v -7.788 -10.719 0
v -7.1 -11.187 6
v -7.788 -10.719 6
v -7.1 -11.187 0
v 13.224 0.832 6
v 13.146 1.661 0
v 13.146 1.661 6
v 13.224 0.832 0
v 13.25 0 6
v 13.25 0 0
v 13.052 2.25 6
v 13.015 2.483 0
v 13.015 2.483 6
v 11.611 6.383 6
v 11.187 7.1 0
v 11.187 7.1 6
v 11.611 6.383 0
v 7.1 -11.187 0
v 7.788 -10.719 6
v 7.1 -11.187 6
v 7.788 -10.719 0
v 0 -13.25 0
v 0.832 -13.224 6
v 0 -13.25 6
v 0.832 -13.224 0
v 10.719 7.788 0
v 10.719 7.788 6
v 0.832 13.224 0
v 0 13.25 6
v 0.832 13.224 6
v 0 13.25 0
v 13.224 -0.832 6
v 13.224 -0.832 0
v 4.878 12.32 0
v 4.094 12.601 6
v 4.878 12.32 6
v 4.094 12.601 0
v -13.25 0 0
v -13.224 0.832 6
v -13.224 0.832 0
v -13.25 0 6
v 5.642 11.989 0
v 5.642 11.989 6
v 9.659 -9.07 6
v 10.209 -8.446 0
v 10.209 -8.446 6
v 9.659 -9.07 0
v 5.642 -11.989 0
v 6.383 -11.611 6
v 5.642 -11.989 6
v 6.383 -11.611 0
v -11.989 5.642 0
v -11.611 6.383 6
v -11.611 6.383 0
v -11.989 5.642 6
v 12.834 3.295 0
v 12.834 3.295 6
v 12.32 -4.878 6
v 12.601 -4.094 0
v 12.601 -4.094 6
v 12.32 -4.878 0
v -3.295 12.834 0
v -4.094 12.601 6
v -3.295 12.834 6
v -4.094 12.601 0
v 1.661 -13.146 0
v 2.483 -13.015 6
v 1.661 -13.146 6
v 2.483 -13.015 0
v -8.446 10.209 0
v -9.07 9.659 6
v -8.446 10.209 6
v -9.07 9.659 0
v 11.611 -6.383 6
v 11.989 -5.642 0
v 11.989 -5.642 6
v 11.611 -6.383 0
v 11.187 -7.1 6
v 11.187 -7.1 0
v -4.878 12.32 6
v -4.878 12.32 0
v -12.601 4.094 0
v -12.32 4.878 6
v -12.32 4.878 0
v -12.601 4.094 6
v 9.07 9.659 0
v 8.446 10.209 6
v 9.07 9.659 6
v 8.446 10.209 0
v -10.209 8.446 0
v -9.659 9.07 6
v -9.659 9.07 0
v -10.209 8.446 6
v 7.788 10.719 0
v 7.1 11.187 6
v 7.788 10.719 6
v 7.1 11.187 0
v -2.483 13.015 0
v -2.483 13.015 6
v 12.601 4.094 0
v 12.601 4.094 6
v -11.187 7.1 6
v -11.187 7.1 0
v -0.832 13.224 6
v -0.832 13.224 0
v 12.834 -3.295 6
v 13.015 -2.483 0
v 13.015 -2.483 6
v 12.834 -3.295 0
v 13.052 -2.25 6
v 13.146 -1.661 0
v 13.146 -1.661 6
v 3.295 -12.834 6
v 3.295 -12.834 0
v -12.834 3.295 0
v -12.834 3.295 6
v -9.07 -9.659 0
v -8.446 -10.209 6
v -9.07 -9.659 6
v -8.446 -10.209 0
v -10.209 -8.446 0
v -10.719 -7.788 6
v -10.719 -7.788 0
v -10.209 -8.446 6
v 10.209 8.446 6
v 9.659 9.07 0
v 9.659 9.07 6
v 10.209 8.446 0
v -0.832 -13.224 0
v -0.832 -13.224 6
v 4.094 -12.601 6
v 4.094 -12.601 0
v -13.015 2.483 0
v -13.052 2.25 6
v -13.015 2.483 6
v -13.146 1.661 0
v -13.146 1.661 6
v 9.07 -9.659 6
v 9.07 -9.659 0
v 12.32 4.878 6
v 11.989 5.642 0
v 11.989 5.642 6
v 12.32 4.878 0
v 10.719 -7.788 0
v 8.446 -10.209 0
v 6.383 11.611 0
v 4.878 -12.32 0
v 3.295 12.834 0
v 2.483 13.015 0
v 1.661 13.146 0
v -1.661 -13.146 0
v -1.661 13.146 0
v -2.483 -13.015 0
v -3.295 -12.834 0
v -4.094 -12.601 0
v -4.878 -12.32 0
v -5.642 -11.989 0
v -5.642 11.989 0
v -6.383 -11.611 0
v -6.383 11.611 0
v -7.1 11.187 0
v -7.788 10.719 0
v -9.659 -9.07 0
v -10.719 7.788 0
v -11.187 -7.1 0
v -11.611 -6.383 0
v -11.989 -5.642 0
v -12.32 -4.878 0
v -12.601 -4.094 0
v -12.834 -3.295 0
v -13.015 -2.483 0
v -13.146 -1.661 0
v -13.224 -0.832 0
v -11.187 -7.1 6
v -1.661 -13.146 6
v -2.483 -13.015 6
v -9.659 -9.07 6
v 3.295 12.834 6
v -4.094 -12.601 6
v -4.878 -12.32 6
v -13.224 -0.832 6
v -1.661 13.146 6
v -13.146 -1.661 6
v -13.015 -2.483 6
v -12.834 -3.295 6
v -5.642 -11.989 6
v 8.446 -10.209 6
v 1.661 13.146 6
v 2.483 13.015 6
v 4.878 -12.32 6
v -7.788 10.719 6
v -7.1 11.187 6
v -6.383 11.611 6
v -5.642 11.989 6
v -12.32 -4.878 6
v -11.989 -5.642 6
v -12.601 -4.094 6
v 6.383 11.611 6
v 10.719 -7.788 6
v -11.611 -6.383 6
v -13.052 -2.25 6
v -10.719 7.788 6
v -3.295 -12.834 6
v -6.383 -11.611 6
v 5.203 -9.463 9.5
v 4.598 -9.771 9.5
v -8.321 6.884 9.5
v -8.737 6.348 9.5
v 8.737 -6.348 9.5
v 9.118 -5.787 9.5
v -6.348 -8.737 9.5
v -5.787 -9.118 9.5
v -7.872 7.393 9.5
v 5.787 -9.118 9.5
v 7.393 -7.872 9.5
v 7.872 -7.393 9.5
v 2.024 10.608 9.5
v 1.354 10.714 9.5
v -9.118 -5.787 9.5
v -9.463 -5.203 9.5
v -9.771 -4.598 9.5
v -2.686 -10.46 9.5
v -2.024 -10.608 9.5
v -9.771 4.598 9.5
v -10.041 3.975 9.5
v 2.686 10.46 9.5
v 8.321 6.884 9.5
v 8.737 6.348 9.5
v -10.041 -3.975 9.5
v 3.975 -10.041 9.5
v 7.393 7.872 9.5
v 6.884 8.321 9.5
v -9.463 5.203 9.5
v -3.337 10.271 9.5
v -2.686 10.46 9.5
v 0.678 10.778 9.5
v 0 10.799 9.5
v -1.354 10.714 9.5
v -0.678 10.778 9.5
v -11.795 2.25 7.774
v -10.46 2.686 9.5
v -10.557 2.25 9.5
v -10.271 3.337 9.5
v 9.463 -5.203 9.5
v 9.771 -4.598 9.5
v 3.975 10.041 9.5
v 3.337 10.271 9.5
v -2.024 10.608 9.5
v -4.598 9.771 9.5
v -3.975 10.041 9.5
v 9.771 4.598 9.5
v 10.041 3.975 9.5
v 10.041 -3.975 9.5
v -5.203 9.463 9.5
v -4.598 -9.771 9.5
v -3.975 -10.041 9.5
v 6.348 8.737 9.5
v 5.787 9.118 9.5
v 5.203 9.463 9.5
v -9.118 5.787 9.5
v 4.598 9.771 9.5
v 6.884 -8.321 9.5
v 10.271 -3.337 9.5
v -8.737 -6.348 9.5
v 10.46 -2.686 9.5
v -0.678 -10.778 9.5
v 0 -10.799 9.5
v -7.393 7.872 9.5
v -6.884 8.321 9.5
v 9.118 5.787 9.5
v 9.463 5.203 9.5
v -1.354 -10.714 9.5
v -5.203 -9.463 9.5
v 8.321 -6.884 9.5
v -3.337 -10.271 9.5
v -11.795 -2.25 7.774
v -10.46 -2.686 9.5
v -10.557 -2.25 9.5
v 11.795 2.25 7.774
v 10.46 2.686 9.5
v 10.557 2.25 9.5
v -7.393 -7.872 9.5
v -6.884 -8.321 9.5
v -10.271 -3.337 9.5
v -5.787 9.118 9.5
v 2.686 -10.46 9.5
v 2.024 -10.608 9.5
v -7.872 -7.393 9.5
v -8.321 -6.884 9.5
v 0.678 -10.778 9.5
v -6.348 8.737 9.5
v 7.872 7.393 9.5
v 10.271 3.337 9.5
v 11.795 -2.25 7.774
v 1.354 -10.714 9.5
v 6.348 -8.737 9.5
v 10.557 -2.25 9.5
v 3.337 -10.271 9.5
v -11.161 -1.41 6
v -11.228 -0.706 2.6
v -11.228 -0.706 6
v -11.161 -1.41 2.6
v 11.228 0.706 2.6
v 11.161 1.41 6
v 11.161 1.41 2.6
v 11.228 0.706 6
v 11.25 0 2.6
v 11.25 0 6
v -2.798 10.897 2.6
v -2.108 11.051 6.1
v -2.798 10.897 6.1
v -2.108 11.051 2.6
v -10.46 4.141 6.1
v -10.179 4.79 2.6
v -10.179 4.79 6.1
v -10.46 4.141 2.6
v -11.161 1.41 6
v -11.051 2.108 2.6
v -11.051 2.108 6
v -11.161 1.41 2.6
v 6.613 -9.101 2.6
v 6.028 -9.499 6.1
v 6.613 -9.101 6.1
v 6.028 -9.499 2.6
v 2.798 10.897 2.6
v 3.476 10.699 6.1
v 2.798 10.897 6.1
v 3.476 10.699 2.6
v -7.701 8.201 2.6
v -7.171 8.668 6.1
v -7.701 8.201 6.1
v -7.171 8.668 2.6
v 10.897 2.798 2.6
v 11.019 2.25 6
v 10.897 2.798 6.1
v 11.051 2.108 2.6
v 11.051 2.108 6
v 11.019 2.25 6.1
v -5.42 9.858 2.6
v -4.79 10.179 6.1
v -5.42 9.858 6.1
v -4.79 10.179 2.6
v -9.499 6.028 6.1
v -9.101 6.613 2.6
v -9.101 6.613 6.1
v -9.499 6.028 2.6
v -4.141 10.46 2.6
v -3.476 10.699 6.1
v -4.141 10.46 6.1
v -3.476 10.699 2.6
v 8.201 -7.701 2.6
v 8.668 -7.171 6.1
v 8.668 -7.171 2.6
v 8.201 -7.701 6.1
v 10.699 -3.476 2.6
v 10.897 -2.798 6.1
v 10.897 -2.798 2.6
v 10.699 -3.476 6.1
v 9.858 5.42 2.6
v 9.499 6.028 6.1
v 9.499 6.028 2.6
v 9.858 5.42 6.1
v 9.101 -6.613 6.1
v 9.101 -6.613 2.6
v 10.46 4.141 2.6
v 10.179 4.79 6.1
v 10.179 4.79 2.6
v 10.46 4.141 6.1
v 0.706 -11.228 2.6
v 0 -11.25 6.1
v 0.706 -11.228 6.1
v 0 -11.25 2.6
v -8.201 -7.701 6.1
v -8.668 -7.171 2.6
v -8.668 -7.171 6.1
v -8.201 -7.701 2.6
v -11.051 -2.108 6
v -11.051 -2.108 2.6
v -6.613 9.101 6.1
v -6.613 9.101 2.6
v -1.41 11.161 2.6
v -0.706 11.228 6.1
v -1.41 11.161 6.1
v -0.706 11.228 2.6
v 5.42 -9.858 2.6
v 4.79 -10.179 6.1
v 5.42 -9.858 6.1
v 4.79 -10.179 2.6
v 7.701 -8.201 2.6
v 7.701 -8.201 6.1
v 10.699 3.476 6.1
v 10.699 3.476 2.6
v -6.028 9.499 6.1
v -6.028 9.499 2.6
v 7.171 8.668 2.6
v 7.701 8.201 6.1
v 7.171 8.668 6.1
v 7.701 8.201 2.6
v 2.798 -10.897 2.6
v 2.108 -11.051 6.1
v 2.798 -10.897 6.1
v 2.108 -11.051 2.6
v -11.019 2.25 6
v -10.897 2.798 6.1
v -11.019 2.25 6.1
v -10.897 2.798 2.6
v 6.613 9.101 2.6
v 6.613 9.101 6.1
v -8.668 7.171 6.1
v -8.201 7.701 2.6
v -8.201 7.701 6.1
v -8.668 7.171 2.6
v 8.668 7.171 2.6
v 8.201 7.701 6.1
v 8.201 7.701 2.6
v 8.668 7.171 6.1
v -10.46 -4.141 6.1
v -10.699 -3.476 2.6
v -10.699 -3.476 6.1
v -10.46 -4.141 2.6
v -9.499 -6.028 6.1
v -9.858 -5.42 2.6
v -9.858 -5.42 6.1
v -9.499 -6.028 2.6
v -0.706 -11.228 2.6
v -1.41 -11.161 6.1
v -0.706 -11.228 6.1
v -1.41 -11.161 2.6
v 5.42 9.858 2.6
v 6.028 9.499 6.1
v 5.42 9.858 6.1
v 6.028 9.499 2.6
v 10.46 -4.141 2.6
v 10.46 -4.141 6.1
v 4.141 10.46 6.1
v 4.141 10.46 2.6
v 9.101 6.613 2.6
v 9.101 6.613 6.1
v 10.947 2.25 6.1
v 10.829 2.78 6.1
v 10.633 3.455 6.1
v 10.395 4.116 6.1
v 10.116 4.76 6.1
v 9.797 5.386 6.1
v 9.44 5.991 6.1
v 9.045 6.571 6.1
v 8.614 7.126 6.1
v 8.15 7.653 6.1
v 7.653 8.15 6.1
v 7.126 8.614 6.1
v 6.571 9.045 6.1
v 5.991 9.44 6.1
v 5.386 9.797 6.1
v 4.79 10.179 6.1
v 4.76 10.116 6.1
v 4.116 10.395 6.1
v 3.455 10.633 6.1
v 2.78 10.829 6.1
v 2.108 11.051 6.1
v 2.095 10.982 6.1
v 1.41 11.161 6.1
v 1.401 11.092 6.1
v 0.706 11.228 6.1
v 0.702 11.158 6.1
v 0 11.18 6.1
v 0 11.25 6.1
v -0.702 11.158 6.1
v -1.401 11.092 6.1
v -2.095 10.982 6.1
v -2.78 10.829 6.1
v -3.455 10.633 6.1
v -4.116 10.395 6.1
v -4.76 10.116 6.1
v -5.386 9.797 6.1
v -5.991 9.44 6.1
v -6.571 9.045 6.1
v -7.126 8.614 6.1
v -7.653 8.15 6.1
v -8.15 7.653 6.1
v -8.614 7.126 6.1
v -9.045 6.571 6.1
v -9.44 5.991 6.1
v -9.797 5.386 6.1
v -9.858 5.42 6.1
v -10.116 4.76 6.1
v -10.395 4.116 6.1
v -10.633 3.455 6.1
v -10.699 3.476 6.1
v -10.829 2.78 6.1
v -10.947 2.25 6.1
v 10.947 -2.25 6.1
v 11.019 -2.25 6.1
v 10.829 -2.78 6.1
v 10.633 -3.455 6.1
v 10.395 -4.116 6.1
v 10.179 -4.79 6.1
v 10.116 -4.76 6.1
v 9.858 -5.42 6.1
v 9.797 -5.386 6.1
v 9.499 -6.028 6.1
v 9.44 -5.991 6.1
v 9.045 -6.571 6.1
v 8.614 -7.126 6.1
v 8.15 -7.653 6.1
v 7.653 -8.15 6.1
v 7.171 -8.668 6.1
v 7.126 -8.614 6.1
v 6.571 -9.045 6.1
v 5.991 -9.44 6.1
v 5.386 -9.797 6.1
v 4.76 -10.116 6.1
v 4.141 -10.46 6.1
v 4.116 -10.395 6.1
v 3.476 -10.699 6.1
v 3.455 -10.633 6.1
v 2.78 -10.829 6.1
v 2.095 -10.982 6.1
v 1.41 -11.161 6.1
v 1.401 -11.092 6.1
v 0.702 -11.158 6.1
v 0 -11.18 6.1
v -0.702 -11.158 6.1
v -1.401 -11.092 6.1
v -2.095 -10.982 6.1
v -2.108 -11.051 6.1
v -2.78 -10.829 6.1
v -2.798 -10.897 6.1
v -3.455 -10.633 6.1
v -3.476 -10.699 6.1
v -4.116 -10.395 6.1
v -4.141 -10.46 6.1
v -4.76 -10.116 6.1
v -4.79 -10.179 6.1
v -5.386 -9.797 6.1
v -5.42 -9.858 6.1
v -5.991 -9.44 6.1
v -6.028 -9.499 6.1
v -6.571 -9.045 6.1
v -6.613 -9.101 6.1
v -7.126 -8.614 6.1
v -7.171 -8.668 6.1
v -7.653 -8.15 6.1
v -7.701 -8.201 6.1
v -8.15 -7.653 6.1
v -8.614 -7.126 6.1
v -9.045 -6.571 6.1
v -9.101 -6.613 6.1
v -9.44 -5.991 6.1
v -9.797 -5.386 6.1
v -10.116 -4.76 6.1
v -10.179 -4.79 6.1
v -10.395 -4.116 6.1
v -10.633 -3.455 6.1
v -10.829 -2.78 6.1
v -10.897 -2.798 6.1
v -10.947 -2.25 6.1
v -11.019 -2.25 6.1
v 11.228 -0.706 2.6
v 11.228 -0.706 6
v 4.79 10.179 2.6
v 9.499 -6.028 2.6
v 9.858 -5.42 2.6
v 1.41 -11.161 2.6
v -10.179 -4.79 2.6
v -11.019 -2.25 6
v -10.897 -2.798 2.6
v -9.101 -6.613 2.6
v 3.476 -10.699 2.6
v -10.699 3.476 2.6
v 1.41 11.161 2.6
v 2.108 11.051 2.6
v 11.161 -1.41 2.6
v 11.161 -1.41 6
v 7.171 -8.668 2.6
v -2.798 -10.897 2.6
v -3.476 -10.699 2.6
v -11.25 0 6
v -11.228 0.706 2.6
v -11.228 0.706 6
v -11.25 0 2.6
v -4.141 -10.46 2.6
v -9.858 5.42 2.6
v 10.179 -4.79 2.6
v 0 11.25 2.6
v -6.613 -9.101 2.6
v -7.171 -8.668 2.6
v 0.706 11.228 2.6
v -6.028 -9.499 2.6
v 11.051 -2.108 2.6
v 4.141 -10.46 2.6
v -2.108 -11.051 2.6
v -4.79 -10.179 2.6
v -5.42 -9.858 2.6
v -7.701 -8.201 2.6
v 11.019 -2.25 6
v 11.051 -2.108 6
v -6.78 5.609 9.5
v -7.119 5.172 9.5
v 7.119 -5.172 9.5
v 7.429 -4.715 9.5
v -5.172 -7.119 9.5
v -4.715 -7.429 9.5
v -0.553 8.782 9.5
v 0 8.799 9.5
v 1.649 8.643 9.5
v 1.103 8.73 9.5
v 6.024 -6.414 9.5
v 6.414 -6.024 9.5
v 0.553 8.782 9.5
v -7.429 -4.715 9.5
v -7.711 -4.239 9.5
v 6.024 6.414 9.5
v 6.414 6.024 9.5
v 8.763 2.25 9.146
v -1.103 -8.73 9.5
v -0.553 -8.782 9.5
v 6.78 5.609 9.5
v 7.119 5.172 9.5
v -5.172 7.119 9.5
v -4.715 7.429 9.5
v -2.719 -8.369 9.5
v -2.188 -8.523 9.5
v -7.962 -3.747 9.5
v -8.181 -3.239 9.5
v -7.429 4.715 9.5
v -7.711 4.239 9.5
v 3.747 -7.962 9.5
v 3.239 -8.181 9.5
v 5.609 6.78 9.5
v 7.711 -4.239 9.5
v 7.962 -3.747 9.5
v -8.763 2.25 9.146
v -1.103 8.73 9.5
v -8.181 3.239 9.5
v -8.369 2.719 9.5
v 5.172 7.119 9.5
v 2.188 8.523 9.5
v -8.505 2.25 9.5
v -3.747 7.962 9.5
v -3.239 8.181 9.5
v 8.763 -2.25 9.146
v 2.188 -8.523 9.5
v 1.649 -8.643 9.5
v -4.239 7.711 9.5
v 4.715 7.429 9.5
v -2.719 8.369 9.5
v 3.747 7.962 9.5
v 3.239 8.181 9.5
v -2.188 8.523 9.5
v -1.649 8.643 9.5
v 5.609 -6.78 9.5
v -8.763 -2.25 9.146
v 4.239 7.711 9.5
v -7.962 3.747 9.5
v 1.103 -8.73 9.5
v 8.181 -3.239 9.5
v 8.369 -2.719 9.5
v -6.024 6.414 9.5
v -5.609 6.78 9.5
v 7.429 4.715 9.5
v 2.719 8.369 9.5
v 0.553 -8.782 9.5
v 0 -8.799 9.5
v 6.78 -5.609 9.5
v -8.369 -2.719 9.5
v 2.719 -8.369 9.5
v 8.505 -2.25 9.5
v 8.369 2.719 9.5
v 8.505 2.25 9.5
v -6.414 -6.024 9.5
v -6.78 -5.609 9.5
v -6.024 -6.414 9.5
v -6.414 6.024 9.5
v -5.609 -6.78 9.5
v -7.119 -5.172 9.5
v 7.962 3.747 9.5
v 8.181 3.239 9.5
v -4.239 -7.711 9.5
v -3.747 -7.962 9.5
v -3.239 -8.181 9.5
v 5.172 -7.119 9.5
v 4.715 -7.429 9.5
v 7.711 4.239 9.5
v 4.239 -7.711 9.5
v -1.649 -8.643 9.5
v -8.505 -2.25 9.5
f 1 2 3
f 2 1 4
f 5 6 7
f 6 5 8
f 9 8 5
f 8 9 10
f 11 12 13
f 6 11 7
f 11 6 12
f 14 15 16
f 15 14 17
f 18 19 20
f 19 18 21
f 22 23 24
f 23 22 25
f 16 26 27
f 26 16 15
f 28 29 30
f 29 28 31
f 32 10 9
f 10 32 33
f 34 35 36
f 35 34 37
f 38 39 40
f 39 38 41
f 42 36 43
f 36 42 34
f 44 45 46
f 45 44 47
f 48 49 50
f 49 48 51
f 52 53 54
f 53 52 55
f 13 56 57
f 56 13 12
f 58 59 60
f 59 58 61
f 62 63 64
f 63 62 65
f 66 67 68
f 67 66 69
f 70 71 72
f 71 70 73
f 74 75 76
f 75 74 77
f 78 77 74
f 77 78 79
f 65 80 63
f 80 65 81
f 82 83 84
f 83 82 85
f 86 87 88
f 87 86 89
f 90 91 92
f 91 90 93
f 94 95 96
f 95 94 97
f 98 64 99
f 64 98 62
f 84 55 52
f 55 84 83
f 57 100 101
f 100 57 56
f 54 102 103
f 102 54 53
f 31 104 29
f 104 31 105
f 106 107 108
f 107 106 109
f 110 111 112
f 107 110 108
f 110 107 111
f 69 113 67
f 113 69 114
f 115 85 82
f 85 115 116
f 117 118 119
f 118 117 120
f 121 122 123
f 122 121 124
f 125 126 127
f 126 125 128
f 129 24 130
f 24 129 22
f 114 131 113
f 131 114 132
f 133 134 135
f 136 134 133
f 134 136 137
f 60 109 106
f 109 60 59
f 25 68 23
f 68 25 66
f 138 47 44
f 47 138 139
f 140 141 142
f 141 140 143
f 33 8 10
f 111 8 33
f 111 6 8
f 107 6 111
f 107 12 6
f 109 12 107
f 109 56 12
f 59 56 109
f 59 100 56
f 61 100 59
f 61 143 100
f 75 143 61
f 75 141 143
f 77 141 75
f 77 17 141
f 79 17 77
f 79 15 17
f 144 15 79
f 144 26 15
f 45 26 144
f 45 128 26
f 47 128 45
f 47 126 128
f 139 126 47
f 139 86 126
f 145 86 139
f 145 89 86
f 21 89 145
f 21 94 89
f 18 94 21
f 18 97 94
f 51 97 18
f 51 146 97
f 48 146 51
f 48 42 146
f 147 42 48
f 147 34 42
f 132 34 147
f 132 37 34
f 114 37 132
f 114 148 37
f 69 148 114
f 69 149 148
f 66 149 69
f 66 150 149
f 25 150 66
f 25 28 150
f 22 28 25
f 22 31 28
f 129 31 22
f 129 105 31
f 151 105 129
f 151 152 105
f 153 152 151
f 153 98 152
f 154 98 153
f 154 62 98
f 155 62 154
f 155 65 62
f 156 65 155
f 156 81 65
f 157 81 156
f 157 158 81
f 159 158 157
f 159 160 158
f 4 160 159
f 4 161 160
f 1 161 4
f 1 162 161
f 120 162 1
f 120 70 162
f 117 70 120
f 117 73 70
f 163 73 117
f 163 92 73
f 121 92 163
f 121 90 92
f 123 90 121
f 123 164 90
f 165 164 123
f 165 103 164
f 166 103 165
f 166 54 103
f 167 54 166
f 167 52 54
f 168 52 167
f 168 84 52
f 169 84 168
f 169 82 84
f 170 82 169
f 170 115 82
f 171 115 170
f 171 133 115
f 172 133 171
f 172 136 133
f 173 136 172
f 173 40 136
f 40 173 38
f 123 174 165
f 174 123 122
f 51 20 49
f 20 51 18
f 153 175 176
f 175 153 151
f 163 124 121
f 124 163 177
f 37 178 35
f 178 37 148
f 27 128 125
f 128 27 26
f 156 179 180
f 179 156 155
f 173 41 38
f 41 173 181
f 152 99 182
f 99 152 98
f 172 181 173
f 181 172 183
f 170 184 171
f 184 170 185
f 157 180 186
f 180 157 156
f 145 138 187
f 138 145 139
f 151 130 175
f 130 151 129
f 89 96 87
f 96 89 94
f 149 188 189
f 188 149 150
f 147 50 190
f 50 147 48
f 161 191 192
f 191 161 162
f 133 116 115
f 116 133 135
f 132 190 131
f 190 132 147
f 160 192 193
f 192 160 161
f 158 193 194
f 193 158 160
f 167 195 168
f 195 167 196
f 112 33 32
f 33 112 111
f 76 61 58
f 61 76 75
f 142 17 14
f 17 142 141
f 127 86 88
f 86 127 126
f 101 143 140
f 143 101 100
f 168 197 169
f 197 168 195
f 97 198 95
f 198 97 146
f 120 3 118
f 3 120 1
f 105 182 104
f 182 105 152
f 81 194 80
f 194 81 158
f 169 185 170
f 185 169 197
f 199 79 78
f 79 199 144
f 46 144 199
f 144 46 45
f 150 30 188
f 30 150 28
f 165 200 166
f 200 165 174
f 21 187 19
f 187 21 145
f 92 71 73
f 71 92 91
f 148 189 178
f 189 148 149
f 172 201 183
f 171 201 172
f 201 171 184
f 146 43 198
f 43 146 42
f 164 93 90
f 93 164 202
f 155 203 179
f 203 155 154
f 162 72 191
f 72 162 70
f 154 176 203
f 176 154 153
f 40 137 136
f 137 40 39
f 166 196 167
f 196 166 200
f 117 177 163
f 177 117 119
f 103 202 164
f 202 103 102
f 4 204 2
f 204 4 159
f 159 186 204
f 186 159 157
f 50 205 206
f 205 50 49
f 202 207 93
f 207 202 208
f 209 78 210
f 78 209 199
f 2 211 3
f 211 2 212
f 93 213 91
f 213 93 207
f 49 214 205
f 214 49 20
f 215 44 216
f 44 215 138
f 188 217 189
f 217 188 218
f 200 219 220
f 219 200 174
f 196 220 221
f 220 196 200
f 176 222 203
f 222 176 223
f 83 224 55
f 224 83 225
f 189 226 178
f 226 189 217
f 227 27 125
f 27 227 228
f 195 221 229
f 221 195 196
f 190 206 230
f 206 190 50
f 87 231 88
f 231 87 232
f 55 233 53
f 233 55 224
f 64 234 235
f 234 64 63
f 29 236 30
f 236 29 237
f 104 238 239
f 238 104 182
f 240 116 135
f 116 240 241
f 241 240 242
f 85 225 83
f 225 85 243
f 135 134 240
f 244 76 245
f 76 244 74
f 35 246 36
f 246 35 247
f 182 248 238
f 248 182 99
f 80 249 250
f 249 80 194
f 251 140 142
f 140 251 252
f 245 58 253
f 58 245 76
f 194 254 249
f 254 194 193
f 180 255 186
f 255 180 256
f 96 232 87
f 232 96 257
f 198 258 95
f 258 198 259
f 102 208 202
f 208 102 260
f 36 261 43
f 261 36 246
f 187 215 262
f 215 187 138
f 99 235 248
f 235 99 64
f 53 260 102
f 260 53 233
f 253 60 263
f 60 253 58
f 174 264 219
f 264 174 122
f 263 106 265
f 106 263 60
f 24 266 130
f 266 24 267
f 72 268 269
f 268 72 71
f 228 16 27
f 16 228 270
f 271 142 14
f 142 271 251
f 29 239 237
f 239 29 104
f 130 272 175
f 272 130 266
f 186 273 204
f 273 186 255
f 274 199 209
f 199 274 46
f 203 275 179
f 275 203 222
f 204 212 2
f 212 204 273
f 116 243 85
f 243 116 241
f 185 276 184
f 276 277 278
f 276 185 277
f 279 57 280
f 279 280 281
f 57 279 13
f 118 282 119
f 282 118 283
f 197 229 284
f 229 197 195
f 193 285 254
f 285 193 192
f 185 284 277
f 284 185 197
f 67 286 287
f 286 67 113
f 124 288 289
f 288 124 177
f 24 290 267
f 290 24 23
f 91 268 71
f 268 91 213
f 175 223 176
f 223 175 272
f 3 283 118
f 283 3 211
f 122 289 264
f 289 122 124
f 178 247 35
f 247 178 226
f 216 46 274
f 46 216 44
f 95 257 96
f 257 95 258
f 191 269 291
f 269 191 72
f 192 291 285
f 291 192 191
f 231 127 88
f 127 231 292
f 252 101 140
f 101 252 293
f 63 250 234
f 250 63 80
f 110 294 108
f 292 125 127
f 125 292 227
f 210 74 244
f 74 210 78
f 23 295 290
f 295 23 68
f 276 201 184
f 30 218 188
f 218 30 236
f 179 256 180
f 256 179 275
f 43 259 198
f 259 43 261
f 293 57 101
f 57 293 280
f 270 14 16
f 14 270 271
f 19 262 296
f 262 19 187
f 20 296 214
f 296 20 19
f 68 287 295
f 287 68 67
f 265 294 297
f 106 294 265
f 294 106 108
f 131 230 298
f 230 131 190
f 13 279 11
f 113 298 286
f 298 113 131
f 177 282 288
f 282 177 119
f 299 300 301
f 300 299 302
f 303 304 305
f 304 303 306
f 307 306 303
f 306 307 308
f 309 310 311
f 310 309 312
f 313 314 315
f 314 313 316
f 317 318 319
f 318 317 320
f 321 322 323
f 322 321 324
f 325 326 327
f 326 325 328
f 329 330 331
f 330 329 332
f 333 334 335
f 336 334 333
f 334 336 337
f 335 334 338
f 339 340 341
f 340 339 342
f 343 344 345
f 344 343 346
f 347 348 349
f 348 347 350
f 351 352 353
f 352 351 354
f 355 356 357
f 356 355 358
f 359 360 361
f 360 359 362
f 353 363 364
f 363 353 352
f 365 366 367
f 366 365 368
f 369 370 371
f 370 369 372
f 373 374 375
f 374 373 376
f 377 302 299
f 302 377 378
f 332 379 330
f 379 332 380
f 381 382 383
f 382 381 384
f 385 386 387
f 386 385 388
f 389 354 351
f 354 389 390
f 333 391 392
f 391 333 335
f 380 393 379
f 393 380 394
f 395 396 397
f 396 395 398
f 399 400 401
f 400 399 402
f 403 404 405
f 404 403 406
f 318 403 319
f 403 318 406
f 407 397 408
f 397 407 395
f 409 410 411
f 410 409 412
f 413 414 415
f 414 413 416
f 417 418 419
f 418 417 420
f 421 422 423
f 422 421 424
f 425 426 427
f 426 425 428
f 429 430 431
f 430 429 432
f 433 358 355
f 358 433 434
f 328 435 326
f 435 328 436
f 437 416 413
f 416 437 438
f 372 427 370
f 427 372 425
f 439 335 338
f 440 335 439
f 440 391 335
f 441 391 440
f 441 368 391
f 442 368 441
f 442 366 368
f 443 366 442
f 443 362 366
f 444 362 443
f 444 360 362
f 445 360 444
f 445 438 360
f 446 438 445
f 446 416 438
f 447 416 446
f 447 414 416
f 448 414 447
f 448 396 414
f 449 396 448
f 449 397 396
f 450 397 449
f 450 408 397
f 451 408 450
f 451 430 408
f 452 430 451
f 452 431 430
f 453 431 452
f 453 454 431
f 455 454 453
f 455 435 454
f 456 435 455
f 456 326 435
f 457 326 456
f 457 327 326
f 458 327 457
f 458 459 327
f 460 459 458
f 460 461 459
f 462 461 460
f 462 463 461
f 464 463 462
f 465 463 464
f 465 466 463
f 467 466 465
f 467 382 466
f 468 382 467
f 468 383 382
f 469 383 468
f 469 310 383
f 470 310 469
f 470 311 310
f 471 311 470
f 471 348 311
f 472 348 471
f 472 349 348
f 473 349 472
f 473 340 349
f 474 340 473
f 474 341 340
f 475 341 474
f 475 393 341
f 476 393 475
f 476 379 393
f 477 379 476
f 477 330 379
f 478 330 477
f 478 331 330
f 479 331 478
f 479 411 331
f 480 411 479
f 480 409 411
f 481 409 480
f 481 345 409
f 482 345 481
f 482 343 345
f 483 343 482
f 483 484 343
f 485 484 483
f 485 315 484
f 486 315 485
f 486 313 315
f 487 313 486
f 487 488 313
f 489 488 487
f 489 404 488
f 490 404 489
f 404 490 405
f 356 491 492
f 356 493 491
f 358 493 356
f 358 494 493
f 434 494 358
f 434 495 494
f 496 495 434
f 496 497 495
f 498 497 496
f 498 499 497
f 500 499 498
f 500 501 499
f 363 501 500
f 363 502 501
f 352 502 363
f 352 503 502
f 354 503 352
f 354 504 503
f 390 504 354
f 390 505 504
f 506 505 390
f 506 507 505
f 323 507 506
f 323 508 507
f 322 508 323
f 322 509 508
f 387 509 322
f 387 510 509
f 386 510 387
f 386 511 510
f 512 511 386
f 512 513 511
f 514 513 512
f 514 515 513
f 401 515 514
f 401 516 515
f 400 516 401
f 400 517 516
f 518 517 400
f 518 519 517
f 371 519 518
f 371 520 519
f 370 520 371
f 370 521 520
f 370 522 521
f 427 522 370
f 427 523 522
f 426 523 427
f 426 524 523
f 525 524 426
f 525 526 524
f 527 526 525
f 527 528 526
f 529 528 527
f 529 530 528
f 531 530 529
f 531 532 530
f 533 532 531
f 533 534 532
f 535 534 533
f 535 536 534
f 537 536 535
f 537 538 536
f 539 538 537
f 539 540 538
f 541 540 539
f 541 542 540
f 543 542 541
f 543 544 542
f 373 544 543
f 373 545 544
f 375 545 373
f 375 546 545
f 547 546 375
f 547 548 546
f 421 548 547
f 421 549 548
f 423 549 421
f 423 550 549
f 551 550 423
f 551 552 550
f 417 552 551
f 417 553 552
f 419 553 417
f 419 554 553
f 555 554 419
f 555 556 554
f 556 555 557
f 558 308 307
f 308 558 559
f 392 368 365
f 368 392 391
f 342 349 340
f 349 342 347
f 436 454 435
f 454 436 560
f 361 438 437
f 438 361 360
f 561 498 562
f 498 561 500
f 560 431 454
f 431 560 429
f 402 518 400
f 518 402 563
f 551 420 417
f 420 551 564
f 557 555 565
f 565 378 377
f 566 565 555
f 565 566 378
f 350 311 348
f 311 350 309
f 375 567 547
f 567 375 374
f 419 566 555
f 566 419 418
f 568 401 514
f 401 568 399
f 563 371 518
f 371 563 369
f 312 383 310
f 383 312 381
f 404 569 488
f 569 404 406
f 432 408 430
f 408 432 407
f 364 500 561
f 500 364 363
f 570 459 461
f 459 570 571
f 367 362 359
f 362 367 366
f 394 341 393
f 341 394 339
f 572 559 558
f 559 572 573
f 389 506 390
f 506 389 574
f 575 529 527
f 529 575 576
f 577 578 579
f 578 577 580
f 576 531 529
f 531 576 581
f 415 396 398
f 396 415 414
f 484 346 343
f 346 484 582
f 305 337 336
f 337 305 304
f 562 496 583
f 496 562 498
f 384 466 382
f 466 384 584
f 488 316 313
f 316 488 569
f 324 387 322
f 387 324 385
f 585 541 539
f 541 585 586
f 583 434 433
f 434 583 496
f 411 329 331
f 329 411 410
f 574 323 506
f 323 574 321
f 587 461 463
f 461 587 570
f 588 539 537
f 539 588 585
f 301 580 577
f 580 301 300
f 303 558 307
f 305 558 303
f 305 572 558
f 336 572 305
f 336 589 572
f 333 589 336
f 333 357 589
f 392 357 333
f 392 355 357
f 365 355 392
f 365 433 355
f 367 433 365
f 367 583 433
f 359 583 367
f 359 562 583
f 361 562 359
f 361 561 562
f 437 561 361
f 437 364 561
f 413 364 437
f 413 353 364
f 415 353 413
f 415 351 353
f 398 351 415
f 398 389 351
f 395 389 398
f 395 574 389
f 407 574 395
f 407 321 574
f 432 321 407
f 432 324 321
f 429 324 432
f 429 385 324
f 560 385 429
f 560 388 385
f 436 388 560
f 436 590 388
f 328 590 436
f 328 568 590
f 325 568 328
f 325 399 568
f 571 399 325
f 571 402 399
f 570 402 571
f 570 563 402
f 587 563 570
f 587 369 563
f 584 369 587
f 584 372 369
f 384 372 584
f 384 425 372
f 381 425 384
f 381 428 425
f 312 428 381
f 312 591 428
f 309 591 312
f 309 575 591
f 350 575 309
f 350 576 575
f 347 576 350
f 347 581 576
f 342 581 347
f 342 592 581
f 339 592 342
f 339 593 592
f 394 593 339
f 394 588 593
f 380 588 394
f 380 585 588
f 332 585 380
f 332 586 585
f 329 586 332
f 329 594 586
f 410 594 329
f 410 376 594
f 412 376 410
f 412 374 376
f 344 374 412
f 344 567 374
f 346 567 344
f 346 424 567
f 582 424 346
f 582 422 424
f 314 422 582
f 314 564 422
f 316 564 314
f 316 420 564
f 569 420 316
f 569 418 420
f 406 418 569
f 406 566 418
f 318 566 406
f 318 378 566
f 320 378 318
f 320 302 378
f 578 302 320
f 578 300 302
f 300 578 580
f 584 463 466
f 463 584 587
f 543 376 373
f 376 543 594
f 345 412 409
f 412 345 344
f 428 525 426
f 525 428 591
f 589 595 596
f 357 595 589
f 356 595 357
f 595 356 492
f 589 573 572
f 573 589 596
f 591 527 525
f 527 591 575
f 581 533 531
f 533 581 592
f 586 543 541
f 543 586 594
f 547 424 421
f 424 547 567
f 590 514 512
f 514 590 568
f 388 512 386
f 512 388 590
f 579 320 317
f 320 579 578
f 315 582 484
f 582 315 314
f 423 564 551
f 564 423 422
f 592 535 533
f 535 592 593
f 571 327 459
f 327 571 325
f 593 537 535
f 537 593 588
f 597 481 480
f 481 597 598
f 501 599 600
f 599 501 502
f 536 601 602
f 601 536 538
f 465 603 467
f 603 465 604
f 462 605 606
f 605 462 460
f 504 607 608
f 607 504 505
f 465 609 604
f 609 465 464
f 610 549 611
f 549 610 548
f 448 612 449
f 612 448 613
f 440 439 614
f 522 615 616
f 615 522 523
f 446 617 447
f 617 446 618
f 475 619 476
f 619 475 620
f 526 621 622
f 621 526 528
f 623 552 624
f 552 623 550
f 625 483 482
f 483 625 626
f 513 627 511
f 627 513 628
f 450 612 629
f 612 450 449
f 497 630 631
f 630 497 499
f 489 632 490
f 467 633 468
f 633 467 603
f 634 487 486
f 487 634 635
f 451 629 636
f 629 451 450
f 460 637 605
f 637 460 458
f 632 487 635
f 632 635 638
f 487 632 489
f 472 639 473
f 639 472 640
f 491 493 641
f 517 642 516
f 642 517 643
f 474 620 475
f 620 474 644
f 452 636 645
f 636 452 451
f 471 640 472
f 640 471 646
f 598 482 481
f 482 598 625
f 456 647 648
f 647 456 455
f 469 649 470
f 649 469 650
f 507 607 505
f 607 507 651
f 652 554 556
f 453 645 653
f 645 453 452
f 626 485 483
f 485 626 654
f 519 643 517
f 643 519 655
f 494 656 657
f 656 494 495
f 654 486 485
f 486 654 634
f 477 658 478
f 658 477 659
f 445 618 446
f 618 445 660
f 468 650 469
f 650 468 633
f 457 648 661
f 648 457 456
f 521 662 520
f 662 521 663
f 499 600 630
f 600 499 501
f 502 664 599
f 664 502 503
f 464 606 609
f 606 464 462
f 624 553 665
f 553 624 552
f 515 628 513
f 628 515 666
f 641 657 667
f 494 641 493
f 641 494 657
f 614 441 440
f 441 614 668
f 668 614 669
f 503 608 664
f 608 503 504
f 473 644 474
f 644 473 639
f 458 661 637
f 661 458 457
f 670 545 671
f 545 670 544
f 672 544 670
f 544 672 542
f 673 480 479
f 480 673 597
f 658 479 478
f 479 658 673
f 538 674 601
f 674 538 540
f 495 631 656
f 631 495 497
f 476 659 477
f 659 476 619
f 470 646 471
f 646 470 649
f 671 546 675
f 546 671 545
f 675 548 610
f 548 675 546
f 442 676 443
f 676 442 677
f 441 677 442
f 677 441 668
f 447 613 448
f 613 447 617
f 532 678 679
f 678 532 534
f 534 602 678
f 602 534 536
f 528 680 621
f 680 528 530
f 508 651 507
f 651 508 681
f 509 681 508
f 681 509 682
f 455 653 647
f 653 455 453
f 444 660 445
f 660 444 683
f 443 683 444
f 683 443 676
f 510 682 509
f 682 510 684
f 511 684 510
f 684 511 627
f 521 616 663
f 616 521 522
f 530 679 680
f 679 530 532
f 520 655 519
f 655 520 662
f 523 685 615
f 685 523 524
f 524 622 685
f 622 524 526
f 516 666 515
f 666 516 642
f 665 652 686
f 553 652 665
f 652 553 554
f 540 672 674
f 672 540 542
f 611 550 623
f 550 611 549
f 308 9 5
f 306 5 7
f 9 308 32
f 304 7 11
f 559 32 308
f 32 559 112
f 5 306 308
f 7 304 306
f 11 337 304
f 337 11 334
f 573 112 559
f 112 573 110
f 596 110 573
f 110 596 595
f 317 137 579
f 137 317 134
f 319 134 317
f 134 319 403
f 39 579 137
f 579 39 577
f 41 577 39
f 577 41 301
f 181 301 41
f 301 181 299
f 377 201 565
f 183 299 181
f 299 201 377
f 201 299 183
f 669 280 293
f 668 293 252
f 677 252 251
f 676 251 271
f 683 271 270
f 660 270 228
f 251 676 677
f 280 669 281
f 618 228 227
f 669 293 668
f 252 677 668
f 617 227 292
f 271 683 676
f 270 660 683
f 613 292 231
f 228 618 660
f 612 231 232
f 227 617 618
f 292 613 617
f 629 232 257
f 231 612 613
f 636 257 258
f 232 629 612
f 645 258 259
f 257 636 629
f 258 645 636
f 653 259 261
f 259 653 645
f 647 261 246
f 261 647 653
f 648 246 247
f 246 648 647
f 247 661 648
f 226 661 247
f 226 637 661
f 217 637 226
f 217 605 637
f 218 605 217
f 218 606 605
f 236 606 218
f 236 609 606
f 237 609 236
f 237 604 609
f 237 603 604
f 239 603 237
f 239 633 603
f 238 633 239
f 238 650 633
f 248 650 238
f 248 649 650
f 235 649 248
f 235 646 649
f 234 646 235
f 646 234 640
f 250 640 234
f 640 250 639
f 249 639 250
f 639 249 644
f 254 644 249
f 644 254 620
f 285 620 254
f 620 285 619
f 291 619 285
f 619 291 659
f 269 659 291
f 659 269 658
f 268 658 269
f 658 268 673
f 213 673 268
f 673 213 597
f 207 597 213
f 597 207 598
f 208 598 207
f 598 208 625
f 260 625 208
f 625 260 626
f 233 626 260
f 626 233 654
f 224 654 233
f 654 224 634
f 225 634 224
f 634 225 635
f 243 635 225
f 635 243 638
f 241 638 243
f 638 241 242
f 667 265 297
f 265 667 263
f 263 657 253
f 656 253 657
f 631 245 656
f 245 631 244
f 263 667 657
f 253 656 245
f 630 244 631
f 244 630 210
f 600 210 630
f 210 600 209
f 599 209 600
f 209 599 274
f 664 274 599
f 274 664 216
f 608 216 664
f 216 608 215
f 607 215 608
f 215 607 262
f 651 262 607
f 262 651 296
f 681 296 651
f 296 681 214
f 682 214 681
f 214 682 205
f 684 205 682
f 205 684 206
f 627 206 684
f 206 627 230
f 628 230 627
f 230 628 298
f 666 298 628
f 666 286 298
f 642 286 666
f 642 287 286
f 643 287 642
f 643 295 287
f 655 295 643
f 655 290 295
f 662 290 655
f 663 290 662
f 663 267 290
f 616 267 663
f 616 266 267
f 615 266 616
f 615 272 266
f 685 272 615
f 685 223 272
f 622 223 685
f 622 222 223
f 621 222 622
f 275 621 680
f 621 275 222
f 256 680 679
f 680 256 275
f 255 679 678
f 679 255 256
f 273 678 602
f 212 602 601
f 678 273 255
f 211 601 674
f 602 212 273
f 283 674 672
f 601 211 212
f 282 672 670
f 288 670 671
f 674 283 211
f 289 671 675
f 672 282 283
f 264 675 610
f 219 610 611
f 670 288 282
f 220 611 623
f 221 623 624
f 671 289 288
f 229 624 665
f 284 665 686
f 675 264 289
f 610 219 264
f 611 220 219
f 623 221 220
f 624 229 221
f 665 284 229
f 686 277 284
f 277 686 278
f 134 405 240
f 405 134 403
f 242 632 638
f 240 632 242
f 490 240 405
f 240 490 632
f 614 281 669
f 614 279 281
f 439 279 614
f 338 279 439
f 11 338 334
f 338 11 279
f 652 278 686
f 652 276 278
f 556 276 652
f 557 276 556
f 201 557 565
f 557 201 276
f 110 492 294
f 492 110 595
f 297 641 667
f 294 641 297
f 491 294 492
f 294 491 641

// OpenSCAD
$fn = 100;

// Bar clamp defaults. Resize these six values for other bars or brands.
// The swivel shape also works for C-clamps; adjust the same dimensions.
//
// Reference sizes:
//   4 in C-clamp:  wallThickness=2, diameter=16, footHeight=2.5,
//                  footThickness=2, slotWidth=2, bootAngle=45
//   10 in C-clamp: wallThickness=2.5, diameter=30.5, footHeight=4,
//                  footThickness=2.5, slotWidth=5.5, bootAngle=45
wallThickness = 2;
diameter = 22.5;
footHeight = 3.5;
footThickness = 2.5;
slotWidth = 4.5;
bootAngle = 55;

//Math
totalHeight = footThickness + footHeight * 2;
radius = (diameter + (wallThickness*2))/2;
innerRadius = radius-wallThickness;

difference(){
  union(){
    cylinder(r=radius, h=footHeight+footThickness);
    translate([0,0,footHeight+footThickness])
      cylinder(h=tan(bootAngle)*radius,r1=radius,r2=0);
    }
  union(){
    translate([0,0,footThickness+.1])
      cylinder(r=innerRadius, h=footHeight);
    translate([0,0,footThickness + footHeight])
      cylinder(h=tan(bootAngle)*innerRadius,r1=innerRadius,r2=0);
    translate([-(radius),-(radius),totalHeight])
      cube([radius*2,radius*2,radius]);
    translate([-(radius),-(slotWidth/2),footHeight+footThickness])
      cube([radius*2,slotWidth,radius*2]);
    }
  }
